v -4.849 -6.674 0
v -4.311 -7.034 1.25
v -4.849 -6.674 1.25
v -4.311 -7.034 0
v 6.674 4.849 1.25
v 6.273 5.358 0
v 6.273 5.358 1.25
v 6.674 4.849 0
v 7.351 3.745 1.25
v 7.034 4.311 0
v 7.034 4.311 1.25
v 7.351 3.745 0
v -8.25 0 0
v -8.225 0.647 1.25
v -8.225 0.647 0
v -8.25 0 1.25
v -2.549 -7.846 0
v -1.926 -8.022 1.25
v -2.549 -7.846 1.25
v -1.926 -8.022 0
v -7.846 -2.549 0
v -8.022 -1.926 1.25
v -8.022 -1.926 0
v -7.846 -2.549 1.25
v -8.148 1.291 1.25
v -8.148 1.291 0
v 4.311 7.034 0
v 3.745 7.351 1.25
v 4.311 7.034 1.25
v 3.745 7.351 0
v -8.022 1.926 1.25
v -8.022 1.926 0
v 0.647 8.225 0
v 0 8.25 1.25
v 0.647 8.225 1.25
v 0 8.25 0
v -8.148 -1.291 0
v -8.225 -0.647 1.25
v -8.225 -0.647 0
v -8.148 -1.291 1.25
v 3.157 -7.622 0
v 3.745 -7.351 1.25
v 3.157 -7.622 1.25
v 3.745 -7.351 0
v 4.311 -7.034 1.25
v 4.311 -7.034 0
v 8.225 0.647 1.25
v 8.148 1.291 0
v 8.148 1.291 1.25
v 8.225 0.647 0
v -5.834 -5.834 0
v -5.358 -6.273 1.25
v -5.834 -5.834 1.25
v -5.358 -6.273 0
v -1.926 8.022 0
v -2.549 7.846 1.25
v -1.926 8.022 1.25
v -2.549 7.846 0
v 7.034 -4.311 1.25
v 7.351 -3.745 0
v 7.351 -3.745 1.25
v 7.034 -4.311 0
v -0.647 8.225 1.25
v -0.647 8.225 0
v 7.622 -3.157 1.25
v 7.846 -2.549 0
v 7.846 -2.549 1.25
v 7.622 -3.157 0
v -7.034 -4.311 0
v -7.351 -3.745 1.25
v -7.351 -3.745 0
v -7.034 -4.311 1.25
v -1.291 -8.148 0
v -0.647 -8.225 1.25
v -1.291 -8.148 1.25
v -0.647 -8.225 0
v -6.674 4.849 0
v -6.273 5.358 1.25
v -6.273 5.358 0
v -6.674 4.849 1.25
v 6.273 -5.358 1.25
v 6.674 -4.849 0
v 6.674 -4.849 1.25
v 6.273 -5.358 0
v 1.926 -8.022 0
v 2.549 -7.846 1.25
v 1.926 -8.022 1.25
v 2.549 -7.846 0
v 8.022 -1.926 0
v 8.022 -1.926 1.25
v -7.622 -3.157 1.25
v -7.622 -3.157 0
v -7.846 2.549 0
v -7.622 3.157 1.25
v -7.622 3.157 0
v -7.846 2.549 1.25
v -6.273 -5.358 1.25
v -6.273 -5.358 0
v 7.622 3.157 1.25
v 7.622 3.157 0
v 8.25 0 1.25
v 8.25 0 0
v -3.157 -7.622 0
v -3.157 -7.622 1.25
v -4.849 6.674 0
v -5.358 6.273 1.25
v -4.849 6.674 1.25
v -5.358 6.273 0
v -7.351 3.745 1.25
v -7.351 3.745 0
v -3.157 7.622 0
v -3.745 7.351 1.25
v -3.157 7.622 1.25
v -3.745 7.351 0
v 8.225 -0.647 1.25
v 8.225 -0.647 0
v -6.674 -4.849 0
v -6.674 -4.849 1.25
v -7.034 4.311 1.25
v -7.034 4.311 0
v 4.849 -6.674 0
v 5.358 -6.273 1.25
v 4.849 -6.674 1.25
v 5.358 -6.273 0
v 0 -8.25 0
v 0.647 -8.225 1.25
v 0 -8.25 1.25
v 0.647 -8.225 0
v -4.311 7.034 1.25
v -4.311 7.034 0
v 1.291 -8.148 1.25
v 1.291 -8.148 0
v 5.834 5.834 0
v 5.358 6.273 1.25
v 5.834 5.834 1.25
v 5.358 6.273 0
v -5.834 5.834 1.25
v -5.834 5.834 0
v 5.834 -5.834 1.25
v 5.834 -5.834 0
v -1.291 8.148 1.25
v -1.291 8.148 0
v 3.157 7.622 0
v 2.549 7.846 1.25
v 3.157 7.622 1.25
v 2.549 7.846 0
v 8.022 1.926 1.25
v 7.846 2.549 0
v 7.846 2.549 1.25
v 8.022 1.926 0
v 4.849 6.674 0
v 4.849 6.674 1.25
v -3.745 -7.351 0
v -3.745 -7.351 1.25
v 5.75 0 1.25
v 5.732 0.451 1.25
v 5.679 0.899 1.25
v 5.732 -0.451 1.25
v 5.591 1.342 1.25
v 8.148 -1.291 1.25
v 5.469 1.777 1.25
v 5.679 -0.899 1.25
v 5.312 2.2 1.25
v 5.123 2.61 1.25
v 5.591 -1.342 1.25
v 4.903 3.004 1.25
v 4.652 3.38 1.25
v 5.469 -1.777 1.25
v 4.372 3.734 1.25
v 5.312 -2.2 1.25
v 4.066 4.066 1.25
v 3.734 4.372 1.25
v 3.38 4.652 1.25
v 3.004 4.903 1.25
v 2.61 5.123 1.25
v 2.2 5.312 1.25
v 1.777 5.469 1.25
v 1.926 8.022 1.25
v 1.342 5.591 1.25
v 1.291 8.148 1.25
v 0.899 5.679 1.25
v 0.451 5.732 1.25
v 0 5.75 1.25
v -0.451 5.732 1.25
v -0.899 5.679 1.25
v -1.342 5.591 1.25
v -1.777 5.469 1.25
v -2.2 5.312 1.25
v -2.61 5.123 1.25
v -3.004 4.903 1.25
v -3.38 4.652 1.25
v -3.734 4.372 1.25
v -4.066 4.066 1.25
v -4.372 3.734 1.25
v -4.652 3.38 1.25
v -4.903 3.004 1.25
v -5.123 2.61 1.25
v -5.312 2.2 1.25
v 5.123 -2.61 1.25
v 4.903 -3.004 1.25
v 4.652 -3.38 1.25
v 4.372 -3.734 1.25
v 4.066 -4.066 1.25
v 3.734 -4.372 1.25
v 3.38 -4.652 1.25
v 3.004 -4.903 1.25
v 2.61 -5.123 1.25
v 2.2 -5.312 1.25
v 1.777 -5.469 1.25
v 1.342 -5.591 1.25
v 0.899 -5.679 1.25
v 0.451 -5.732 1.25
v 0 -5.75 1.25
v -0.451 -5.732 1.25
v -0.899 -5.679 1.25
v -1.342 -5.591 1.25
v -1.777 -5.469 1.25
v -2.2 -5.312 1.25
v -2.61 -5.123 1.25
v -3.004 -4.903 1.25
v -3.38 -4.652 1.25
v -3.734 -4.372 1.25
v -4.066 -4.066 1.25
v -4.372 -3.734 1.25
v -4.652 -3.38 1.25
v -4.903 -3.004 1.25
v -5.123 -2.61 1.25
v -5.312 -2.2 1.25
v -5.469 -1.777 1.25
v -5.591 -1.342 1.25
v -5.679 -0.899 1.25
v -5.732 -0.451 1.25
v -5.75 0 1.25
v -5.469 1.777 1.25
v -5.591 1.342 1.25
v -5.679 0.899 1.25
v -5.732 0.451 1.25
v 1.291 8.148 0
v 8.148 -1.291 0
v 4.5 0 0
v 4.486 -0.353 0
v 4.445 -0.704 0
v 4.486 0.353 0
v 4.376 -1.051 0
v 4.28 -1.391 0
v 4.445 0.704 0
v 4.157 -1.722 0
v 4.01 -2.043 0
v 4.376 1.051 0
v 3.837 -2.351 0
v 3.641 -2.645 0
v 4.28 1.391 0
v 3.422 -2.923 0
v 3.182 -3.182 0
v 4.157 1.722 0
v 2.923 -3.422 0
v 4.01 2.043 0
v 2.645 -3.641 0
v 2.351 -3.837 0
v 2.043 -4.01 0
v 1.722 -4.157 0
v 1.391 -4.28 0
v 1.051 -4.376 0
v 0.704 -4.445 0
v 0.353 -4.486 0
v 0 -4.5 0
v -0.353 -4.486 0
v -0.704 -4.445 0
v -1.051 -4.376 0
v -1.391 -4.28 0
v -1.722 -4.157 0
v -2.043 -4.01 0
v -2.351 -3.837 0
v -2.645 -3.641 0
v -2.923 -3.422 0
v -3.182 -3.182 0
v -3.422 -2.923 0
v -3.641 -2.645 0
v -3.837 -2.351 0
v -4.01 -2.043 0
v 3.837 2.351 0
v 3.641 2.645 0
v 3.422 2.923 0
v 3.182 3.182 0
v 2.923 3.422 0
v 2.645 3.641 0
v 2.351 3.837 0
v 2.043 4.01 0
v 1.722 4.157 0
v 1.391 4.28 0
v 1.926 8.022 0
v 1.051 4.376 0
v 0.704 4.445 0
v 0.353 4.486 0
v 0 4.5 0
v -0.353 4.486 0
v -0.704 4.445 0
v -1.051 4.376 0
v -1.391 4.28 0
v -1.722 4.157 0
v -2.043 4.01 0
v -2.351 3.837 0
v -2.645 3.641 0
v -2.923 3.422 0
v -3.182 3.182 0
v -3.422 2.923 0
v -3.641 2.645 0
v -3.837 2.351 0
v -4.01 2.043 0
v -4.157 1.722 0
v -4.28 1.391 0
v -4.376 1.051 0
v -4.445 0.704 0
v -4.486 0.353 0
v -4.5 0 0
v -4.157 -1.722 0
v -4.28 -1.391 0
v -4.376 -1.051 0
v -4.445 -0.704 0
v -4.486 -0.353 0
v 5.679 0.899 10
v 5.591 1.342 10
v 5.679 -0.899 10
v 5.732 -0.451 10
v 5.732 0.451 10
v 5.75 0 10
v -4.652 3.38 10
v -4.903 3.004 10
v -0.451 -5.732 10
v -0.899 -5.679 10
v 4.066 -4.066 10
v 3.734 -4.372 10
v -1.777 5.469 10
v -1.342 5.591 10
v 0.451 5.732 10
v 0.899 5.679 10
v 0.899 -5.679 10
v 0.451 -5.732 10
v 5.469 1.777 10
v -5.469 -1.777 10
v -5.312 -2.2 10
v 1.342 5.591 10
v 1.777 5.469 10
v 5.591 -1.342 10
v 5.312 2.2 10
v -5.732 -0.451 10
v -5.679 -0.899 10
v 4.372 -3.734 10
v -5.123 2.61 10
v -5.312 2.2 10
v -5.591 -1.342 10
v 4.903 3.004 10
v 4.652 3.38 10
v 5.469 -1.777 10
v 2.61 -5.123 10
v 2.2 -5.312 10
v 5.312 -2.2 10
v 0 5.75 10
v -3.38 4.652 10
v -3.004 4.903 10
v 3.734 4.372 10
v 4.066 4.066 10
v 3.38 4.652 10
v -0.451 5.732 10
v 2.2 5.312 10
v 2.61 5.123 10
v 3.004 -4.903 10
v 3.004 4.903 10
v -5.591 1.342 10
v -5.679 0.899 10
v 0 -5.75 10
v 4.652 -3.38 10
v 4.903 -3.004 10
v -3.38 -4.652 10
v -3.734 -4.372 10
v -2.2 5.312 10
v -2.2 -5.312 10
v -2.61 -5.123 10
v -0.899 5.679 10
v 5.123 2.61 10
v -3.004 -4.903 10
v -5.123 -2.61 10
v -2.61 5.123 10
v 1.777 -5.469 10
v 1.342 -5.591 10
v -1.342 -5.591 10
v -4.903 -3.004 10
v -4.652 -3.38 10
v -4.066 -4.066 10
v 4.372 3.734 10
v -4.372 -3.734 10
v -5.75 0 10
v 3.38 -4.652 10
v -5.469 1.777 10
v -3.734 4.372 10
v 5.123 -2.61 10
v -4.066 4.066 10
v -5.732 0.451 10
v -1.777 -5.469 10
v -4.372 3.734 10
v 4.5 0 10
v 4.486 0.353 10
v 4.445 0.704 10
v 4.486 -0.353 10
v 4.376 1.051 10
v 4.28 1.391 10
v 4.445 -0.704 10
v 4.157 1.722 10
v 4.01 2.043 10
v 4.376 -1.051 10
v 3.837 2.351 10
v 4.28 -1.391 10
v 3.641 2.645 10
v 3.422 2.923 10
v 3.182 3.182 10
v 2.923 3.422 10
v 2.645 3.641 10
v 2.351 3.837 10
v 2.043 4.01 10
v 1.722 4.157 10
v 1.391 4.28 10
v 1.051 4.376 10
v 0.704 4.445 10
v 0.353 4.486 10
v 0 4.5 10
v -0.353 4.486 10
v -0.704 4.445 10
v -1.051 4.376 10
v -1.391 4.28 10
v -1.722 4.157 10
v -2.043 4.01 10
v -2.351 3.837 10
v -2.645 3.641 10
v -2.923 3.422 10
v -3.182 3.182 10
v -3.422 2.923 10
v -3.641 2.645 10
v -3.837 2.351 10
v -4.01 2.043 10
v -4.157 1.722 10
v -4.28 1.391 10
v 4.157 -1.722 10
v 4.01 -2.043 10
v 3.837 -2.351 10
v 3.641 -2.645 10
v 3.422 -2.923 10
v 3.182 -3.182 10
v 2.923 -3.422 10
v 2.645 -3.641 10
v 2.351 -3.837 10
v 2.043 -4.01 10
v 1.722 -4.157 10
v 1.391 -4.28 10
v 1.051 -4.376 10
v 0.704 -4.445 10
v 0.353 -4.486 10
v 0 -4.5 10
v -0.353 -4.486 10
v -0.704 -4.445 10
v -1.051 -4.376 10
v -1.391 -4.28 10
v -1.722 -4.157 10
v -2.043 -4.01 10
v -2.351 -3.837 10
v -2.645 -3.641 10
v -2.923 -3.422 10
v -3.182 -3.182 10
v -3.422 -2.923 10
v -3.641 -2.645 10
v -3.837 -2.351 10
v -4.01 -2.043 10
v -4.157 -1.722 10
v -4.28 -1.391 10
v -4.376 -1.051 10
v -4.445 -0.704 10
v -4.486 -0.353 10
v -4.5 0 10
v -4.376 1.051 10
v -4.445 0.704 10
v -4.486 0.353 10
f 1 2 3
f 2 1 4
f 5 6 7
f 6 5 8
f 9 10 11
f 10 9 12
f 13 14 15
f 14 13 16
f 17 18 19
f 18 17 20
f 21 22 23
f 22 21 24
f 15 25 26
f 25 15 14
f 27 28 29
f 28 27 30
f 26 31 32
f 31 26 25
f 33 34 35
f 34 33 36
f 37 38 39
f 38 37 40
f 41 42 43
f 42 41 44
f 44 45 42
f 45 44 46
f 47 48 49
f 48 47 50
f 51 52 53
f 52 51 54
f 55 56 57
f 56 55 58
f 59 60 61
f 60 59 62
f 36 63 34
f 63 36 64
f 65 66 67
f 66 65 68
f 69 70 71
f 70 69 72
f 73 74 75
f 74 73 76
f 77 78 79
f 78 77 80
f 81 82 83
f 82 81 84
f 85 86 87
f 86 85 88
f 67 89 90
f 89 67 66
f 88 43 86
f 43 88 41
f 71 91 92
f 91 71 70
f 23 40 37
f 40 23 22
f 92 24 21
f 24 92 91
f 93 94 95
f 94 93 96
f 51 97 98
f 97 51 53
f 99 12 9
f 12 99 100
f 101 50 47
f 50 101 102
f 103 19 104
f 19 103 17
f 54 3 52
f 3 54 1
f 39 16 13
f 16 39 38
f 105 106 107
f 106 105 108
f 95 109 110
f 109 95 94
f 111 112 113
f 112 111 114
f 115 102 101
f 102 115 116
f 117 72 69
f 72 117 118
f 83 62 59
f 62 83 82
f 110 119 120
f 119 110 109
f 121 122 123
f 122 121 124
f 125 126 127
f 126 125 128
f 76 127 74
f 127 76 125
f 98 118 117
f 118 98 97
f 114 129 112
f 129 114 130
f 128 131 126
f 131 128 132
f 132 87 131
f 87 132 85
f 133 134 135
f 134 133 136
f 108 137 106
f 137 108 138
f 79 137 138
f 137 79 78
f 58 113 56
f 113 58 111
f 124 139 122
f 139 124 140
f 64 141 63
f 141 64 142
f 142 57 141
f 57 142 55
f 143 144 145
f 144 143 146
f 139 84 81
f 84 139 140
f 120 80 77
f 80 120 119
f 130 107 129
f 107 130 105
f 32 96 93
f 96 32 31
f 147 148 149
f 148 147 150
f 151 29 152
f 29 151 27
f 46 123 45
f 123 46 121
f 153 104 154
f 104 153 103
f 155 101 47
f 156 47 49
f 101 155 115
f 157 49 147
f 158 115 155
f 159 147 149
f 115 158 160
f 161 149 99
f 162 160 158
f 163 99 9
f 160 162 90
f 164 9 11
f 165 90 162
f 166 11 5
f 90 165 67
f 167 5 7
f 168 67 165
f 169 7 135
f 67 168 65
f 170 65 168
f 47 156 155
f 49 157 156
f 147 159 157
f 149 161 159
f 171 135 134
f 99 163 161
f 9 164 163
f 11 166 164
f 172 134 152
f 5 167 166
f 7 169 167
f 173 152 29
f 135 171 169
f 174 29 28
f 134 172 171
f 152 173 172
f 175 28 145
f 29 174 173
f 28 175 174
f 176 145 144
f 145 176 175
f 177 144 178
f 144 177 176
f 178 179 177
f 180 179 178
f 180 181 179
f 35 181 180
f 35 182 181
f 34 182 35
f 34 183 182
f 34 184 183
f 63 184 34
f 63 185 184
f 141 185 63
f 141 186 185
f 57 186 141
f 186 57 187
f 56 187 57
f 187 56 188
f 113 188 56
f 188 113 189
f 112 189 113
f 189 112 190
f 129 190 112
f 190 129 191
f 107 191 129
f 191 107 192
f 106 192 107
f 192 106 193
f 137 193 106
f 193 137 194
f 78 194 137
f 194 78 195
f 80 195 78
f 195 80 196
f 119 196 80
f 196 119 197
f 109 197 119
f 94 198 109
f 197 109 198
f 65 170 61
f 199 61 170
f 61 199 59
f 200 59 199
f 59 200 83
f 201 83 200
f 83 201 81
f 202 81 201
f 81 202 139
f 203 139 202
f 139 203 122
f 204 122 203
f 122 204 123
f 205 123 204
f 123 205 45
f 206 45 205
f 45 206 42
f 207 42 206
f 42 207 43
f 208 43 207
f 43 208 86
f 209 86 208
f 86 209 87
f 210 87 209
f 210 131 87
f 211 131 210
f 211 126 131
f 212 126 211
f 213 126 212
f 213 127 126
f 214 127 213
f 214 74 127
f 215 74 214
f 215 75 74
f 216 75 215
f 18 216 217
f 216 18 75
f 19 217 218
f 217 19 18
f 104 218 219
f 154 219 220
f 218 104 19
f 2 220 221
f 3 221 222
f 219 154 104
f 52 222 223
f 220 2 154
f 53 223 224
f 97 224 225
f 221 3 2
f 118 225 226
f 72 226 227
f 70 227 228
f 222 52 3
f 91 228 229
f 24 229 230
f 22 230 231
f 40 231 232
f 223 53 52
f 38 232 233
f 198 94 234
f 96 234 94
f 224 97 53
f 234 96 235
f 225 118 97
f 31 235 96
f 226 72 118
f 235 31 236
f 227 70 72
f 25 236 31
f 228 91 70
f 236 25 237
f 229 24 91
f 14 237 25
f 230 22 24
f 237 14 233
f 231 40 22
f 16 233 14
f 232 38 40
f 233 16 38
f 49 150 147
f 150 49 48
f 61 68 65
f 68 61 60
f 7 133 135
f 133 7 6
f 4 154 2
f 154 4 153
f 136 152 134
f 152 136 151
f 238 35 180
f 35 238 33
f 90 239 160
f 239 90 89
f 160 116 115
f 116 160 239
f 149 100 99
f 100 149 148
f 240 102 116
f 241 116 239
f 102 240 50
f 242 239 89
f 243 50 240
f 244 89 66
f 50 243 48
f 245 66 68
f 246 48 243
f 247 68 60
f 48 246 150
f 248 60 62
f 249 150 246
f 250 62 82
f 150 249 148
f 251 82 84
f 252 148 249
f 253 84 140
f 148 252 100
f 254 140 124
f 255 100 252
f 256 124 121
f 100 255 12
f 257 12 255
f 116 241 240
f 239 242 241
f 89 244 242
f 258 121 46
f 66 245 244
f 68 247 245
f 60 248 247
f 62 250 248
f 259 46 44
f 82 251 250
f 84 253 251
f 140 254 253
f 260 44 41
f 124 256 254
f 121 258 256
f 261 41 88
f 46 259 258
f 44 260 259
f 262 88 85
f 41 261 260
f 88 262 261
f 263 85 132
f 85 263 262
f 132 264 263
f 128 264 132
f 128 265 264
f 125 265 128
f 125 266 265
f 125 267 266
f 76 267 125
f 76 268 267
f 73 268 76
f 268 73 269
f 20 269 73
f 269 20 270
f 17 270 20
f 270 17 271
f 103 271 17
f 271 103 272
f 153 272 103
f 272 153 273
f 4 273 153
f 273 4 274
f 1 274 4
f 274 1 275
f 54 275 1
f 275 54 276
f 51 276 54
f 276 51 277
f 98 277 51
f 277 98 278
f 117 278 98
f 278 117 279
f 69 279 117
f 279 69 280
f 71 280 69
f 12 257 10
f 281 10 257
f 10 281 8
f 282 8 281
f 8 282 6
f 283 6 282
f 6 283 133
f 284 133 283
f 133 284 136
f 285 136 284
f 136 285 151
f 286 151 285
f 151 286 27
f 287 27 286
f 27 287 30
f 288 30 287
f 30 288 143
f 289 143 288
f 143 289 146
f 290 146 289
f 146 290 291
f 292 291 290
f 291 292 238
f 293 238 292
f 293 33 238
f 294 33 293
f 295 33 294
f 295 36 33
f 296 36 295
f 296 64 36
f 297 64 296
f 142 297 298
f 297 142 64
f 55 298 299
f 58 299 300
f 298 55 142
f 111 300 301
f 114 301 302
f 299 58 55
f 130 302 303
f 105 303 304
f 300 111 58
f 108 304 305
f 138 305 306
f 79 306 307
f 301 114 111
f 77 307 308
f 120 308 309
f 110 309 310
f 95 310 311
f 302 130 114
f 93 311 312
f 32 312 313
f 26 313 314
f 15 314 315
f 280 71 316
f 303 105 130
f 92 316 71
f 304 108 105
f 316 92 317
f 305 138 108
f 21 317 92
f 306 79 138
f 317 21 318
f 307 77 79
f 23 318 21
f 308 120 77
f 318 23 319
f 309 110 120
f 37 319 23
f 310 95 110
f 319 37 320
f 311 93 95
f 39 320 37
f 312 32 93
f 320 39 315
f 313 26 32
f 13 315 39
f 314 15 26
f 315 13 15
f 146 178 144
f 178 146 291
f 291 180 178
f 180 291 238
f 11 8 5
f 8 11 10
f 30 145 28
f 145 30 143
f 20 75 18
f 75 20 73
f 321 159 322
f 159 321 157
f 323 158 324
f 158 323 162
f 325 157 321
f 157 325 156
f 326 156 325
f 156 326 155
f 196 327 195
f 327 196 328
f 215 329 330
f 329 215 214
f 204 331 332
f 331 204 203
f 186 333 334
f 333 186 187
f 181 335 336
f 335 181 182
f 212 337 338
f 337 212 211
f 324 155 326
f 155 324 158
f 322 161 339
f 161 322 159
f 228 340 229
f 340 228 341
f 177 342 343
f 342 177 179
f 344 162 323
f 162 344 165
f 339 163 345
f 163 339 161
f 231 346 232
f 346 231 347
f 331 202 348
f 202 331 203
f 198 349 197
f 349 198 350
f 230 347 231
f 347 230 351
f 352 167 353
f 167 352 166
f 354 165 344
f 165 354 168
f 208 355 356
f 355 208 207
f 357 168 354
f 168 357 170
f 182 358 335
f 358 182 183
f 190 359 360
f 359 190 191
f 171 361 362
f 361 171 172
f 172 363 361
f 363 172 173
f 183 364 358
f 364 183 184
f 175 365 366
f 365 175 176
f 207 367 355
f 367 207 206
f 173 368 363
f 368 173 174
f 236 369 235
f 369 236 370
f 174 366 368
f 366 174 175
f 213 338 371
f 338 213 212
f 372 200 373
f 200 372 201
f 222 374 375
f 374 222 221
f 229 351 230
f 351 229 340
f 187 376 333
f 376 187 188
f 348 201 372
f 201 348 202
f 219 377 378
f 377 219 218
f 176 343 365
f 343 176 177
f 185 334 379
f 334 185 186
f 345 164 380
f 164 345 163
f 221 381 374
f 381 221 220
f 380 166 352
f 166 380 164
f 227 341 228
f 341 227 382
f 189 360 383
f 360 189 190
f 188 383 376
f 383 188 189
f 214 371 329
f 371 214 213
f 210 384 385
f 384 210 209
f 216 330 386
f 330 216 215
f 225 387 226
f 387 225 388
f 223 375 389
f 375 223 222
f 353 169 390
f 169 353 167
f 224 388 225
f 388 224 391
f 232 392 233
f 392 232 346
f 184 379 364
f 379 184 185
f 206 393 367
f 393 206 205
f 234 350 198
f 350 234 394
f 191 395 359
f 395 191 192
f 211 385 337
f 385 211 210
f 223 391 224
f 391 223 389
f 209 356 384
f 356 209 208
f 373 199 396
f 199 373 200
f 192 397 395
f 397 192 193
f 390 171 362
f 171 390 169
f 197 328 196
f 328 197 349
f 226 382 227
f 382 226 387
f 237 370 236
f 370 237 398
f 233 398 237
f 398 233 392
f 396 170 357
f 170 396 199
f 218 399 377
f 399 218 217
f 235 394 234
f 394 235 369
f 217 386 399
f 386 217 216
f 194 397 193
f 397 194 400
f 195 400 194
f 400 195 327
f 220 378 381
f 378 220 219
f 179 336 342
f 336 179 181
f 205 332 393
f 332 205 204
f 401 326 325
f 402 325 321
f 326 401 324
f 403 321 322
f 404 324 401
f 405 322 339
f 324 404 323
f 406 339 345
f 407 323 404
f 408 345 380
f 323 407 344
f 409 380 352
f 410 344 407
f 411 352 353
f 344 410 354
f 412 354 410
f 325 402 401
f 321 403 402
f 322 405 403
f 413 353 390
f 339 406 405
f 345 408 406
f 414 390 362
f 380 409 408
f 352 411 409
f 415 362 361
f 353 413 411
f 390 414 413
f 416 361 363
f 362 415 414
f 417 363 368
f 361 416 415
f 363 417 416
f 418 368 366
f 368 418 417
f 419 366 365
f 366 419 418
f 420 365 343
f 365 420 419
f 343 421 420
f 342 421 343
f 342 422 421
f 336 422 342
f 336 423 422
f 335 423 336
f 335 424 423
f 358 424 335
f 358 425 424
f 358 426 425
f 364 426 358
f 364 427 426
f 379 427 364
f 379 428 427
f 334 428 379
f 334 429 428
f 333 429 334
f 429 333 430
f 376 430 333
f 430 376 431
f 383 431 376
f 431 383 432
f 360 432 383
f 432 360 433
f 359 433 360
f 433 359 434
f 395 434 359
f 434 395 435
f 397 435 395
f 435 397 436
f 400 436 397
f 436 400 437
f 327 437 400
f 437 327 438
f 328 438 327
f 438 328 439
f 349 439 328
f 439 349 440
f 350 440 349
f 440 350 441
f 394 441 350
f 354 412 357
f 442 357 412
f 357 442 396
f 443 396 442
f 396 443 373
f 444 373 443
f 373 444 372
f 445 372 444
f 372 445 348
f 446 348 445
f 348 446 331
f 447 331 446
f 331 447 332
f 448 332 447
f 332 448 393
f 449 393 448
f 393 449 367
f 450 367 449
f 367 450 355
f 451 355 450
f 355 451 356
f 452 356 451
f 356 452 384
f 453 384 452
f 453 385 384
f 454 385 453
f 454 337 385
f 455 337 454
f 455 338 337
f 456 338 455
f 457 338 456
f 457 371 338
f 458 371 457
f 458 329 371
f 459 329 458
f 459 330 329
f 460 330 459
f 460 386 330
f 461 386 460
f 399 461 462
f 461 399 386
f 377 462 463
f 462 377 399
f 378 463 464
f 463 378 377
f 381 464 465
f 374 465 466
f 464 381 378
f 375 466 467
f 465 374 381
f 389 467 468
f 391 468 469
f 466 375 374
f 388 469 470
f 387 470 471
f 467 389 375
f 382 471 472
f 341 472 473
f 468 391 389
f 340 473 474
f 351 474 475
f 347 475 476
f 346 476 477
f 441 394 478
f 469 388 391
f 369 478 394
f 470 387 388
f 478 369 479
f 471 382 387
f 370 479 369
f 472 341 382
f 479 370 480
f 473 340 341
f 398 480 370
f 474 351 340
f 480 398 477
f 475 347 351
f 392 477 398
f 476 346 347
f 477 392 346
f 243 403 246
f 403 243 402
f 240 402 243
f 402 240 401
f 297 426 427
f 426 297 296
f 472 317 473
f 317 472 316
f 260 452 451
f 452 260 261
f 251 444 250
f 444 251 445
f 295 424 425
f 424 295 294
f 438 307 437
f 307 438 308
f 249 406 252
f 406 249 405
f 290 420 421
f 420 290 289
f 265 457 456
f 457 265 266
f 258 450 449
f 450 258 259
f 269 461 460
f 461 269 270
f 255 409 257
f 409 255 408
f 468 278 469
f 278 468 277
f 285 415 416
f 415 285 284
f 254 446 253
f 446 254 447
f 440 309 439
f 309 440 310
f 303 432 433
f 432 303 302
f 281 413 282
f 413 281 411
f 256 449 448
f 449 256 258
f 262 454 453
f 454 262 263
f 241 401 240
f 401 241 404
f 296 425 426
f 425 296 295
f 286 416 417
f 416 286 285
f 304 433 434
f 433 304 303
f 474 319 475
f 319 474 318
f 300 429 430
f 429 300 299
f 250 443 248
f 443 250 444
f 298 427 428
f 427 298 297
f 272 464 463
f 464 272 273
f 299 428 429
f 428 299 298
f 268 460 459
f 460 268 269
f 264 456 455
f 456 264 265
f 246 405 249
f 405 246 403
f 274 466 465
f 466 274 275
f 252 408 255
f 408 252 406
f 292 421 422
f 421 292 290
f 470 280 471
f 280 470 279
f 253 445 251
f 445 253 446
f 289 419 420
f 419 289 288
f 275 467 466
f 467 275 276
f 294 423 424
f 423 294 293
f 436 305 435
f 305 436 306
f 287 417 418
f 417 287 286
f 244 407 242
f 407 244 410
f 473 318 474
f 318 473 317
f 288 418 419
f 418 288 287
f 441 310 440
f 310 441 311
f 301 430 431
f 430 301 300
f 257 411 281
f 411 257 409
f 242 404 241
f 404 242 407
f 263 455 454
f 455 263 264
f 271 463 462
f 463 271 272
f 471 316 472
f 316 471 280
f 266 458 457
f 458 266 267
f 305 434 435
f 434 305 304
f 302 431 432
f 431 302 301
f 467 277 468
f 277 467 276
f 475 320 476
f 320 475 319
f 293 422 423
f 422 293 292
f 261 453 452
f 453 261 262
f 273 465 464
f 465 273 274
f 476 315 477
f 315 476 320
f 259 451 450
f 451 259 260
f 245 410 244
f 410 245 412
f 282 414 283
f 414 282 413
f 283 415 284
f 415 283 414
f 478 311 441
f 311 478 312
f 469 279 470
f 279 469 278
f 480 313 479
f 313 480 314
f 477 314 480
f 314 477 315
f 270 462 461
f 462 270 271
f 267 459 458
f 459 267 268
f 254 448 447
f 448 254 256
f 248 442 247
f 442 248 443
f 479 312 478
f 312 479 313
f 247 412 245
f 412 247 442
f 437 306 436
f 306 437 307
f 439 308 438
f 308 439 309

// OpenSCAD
// file: common.scad
// Measurements and routines common across adapters.

band_full_thickness = 1.25;    // thickest point of the band
band_full_diameter = 16.5;  // diameter at widest point of band

// profile = [
//     [0,0],
//     [band_edge_diameter / 2, 0],
//     [band_full_diameter / 2, (band_full_thickness - band_edge_thickness) / 2],
//     [band_full_diameter / 2, band_full_thickness - ((band_full_thickness - band_edge_thickness) / 2)],
//     [band_edge_diameter / 2, band_full_thickness],
//     [0,band_full_thickness],
// ];

profile = [
    [0,0],
    [band_full_diameter / 2, 0],
    [band_full_diameter / 2, band_full_thickness],
    [0,band_full_thickness],
];

module band() {
    rotate_extrude($fn=80) polygon(points=profile);
}
// main file
// Plotter pen adapter for Pigma Micron pens
//
// Modified by Sasha Kovar <sasha-thing@arcocene.org>
// from a design by Brian Boucheron <brian@boucheron.org>

include <common.scad>;

body_outer_diameter = 11.5;
body_inner_diameter = 9;
body_height1 = 10;
body_height2 = 19;

module top(clip) {
	difference() {
		cylinder(r=body_outer_diameter/2, h=body_height2, $fn=80);
		cylinder(r=body_inner_diameter/2, h=50, $fn=80);
		translate([0,0,3]) cutout();
		if (clip) {
			translate([-5, -5, 18]) cube([10,10,2]);
		}
	}
}

module cutout() {
	difference() {
		cylinder(r=body_outer_diameter, h=20, $fn=80);
		cylinder(r1=body_outer_diameter, r2=0, h=20, $fn=80);
	}
}

union() {
	difference() {
		union() {
			band();
			cylinder(r=body_outer_diameter/2, h=body_height1, $fn=80);
		}

		translate([0,0,-10]) cylinder(r=body_inner_diameter/2, h=50, $fn=80);
		
		// translate([0,0,-10]) {
		// 	top();
		// }
	}
}
